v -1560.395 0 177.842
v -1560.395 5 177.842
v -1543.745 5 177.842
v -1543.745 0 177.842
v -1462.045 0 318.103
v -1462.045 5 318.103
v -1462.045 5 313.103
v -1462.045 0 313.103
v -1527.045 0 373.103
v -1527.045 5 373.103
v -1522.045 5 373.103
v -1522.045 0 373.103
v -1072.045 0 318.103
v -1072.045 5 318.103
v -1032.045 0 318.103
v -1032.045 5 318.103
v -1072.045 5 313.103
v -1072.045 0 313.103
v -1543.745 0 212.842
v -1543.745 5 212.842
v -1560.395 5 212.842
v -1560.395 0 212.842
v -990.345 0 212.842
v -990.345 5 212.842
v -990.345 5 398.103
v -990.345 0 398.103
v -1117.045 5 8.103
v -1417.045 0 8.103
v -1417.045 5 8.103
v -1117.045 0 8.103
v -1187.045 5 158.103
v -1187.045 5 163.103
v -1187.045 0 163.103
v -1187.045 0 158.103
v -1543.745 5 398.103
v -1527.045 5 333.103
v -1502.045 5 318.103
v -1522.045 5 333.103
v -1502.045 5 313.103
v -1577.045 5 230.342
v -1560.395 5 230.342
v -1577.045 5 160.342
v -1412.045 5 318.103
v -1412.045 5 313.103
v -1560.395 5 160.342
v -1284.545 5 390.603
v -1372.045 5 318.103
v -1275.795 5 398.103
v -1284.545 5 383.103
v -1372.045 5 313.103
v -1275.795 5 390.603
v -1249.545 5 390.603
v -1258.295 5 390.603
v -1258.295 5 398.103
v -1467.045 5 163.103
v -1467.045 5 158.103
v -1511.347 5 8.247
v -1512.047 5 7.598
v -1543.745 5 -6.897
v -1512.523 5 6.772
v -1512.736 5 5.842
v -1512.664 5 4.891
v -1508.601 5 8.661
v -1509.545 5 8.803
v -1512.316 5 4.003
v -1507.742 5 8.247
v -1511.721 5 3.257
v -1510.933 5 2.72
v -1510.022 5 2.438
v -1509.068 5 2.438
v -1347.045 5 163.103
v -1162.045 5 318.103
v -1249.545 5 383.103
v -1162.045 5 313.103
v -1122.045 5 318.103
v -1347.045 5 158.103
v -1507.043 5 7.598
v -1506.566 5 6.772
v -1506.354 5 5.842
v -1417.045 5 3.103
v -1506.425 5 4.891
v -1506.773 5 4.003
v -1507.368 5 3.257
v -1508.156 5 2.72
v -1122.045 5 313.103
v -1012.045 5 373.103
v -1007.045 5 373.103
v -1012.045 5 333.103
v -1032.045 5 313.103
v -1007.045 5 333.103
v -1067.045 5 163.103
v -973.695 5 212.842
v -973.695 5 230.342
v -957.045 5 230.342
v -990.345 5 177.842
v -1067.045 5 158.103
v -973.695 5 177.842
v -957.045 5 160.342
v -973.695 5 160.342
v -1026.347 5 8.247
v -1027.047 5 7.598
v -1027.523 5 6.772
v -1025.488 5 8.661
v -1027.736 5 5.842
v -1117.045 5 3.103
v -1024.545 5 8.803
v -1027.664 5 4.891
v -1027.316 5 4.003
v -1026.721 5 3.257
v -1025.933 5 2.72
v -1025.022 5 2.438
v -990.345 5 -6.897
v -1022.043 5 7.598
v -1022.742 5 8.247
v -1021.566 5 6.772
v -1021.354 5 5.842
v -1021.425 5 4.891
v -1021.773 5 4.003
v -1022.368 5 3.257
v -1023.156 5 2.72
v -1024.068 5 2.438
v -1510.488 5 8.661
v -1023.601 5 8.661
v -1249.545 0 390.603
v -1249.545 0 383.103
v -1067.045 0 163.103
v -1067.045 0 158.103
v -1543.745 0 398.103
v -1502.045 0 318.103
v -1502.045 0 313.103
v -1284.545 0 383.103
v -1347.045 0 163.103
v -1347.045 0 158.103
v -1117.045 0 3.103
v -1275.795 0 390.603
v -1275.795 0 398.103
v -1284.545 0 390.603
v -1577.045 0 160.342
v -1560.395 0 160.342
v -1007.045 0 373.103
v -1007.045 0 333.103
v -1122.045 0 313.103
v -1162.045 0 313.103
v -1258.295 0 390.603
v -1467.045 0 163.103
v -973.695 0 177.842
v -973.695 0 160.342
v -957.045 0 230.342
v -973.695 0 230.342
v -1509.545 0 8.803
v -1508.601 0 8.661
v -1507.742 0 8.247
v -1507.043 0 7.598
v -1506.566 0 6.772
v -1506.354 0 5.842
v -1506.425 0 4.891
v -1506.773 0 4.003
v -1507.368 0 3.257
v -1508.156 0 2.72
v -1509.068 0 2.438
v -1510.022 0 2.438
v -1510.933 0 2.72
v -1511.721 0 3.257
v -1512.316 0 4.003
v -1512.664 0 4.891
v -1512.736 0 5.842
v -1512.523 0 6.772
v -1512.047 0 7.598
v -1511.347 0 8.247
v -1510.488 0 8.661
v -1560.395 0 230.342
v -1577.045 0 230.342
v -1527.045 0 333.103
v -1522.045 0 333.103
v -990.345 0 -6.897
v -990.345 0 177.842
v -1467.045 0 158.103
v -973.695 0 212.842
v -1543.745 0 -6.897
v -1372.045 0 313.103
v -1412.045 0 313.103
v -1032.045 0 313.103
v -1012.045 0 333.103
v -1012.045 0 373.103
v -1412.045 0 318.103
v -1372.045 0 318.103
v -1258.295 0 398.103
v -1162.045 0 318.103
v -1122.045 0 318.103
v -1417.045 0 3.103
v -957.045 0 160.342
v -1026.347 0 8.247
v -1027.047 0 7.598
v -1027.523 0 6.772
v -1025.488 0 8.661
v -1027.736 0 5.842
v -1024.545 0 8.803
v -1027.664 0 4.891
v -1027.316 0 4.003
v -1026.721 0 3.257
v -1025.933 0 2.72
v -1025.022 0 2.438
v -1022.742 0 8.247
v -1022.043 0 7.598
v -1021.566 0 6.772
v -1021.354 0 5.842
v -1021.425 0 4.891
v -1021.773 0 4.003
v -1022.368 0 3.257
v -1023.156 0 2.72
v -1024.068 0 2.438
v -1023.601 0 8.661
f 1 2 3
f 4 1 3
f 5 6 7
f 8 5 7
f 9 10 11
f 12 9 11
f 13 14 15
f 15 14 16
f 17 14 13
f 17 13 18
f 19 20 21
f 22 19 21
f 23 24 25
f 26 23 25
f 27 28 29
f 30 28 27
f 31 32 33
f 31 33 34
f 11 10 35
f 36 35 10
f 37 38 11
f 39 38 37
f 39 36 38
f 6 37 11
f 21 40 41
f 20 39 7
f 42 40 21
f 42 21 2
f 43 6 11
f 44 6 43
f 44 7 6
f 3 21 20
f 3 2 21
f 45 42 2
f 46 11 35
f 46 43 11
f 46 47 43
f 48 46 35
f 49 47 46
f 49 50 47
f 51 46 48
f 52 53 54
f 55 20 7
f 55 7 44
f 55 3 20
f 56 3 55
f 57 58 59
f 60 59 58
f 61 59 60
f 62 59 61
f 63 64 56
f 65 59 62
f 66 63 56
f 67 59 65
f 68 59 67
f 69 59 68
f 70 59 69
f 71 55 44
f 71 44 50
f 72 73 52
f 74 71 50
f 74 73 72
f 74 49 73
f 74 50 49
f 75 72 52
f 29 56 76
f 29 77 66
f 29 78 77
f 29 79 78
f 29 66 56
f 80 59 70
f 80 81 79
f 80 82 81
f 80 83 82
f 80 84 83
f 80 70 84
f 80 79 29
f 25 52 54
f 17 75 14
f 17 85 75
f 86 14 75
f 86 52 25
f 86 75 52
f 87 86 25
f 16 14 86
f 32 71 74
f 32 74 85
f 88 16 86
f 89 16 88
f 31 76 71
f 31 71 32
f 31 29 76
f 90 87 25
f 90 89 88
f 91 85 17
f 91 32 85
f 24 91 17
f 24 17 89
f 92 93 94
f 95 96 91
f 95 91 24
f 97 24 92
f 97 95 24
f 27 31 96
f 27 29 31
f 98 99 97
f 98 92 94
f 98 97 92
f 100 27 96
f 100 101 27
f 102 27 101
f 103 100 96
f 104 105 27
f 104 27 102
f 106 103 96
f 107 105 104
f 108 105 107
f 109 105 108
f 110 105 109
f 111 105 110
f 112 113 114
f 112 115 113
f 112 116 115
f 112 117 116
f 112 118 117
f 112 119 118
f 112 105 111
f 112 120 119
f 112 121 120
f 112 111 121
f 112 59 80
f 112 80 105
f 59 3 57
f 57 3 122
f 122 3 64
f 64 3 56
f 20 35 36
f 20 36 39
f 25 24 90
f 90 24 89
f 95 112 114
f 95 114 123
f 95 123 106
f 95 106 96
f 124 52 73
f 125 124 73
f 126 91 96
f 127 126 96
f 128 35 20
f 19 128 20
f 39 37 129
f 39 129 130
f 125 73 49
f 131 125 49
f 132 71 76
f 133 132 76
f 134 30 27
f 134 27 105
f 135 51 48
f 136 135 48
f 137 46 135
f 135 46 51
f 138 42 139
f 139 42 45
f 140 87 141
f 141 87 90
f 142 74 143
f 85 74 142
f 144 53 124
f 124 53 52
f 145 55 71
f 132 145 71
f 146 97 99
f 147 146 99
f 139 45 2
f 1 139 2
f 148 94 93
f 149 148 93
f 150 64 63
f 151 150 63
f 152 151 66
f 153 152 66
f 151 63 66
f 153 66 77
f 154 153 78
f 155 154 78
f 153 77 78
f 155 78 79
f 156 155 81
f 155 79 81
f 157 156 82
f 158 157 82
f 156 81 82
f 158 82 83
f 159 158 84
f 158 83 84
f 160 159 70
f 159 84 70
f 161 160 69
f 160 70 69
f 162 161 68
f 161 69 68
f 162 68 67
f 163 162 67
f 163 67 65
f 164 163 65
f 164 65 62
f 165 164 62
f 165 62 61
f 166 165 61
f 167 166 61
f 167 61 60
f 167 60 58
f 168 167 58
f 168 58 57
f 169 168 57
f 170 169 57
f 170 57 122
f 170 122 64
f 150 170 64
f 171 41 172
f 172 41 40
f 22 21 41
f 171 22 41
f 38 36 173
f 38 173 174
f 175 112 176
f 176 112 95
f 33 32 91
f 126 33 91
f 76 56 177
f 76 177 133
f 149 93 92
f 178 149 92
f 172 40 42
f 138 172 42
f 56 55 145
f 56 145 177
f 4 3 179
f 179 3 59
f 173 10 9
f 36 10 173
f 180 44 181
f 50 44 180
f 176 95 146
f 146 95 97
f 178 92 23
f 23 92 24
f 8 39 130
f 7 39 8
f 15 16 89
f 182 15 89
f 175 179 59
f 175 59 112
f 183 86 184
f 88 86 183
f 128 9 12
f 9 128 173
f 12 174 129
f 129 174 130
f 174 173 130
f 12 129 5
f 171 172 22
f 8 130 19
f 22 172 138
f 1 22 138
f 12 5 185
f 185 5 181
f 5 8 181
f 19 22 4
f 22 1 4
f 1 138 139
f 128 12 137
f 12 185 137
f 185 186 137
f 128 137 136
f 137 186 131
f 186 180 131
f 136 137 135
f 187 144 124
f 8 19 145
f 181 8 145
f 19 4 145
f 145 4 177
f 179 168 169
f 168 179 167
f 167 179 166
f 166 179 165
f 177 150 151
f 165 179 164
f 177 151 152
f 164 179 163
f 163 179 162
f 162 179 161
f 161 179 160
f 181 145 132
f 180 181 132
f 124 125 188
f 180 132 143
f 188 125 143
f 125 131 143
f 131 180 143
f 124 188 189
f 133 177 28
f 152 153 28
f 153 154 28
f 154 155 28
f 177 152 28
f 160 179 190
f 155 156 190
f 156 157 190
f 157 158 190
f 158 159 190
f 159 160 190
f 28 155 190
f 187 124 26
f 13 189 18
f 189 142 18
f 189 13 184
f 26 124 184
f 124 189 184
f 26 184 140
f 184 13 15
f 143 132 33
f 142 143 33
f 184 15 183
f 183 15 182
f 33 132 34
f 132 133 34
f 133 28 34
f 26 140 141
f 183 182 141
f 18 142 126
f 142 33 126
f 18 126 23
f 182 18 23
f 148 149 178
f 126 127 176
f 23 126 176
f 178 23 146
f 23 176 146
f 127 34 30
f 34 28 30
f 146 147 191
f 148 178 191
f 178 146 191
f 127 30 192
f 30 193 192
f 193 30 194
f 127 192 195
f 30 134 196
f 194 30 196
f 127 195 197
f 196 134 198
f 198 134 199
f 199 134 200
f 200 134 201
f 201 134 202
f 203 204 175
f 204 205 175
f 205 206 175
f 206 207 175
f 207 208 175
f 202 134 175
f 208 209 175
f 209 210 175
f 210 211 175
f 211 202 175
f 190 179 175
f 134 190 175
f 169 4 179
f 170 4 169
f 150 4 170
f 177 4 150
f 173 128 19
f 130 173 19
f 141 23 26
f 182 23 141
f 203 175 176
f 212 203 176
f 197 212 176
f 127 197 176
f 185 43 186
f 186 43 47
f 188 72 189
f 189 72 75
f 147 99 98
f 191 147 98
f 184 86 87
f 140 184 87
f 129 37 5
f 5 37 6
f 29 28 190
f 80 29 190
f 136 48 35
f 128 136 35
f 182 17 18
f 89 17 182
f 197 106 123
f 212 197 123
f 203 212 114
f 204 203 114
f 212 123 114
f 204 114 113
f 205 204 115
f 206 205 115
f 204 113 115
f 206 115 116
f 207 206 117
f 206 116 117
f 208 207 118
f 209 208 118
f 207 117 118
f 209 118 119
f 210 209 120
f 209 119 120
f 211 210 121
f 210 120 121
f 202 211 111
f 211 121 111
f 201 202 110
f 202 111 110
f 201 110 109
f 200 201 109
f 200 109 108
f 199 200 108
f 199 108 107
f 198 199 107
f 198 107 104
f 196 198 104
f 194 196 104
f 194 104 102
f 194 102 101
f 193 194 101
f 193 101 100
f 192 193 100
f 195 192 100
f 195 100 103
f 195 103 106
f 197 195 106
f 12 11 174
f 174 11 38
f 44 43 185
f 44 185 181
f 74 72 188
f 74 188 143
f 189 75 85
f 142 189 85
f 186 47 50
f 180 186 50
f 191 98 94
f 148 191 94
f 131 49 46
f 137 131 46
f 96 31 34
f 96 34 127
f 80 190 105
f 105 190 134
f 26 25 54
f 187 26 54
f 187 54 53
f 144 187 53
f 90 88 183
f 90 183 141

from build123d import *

# Parameters (mm, degrees)
CROQUIS1_W              = 1660
CROQUIS1_H              = 810
CROQUIS1_W_2            = 300
CROQUIS1_H_2            = 5
SALIENTE_EXTRUIR3_DEPTH = 5
CROQUIS2_W              = 5
CROQUIS2_H              = 40
CROQUIS2_W_2            = 30
CROQUIS2_H_2            = 5
CROQUIS2_W_3            = 120
CROQUIS2_W_4            = 32.5
CROQUIS2_H_3            = 45
CROQUIS2_W_5            = 40
CORTAR_EXTRUIR2_DEPTH   = 10
CROQUIS3_R              = 3.2
CORTAR_EXTRUIR3_DEPTH   = 10
CORTAR_EXTRUIR5_DEPTH   = 10


with BuildPart() as part:
    # Croquis1 → Saliente-Extruir3 (new body)
    with BuildSketch(Plane(origin=(0, 0, 0), x_dir=(1, 0, 0), z_dir=(0, 1, 0))):
        with Locations((-1267.044657187, -398.10267676)):
            Rectangle(CROQUIS1_W, CROQUIS1_H)
        Polygon((-447.044657187, -95.60267676), (-447.044657187, -240.60267676), (-452.044657187, -240.60267676), (-452.044657187, -95.60267676), (-452.044657187, -90.60267676), (-447.044657187, -90.60267676), align=None, mode=Mode.SUBTRACT)
        with Locations((-782.044657187, -5.60267676)):
            Rectangle(CROQUIS1_W_2, CROQUIS1_H_2, mode=Mode.SUBTRACT)
        with Locations((-1267.044657187, -5.60267676)):
            Rectangle(CROQUIS1_W_2, CROQUIS1_H_2, mode=Mode.SUBTRACT)
        with Locations((-1752.044657187, -5.60267676)):
            Rectangle(CROQUIS1_W_2, CROQUIS1_H_2, mode=Mode.SUBTRACT)
        Polygon((-452.044657187, -328.10267676), (-452.044657187, -473.10267676), (-447.044657187, -473.10267676), (-447.044657187, -328.10267676), (-447.044657187, -323.10267676), (-452.044657187, -323.10267676), align=None, mode=Mode.SUBTRACT)
        Polygon((-452.044657187, -560.60267676), (-452.044657187, -705.60267676), (-447.044657187, -705.60267676), (-447.044657187, -560.60267676), (-447.044657187, -555.60267676), (-452.044657187, -555.60267676), align=None, mode=Mode.SUBTRACT)
        Polygon((-2087.044657187, -705.60267676), (-2082.044657187, -705.60267676), (-2082.044657187, -560.60267676), (-2082.044657187, -555.60267676), (-2087.044657187, -555.60267676), (-2087.044657187, -560.60267676), align=None, mode=Mode.SUBTRACT)
        Polygon((-2087.044657187, -473.10267676), (-2082.044657187, -473.10267676), (-2082.044657187, -328.10267676), (-2082.044657187, -323.10267676), (-2087.044657187, -323.10267676), (-2087.044657187, -328.10267676), align=None, mode=Mode.SUBTRACT)
        Polygon((-2087.044657187, -240.60267676), (-2082.044657187, -240.60267676), (-2082.044657187, -95.60267676), (-2082.044657187, -90.60267676), (-2087.044657187, -90.60267676), (-2087.044657187, -95.60267676), align=None, mode=Mode.SUBTRACT)
        with Locations((-1267.044657187, -790.60267676)):
            Rectangle(CROQUIS1_W_2, CROQUIS1_H_2, mode=Mode.SUBTRACT)
        with Locations((-782.044657187, -790.60267676)):
            Rectangle(CROQUIS1_W_2, CROQUIS1_H_2, mode=Mode.SUBTRACT)
        with Locations((-1752.044657187, -790.60267676)):
            Rectangle(CROQUIS1_W_2, CROQUIS1_H_2, mode=Mode.SUBTRACT)
    extrude(amount=SALIENTE_EXTRUIR3_DEPTH)

    # Croquis2 → Cortar-Extruir2 (cut)
    with BuildSketch(Plane(origin=(0, 5, 0), x_dir=(1, 0, 0), z_dir=(0, 1, 0))):
        with Locations((-1009.544657188, -443.10267676)):
            Rectangle(CROQUIS2_W, CROQUIS2_H)
        with Locations((-684.544657187, -635.60267676)):
            Rectangle(CROQUIS2_W_2, CROQUIS2_H_2)
        with Locations((-1127.044657187, -635.60267676)):
            Rectangle(CROQUIS2_W_3, CROQUIS2_H_2)
        with Locations((-1407.044657187, -635.60267676)):
            Rectangle(CROQUIS2_W_3, CROQUIS2_H_2)
        with Locations((-629.544657187, -635.60267676)):
            Rectangle(CROQUIS2_W_2, CROQUIS2_H_2)
        with Locations((-1404.544657188, -480.60267676)):
            Rectangle(CROQUIS2_W_3, CROQUIS2_H_2)
        with Locations((-785.794657187, -480.60267676)):
            Rectangle(CROQUIS2_W_4, CROQUIS2_H_2)
        with Locations((-833.294657187, -480.60267676)):
            Rectangle(CROQUIS2_W_4, CROQUIS2_H_2)
        with Locations((-604.544657187, -513.10267676)):
            Rectangle(CROQUIS2_W, CROQUIS2_H_3)
        with Locations((-864.544657187, -675.60267676)):
            Rectangle(CROQUIS2_W, CROQUIS2_H_3)
        with Locations((-1052.044657188, -315.60267676)):
            Rectangle(CROQUIS2_W_5, CROQUIS2_H_2)
        with Locations((-1142.044657188, -315.60267676)):
            Rectangle(CROQUIS2_W_5, CROQUIS2_H_2)
        with Locations((-1009.544657188, -353.10267676)):
            Rectangle(CROQUIS2_W, CROQUIS2_H)
        with Locations((-1124.544657188, -480.60267676)):
            Rectangle(CROQUIS2_W_3, CROQUIS2_H_2)
        with Locations((-604.544657187, -593.10267676)):
            Rectangle(CROQUIS2_W, CROQUIS2_H_3)
        with Locations((-1127.044657187, -160.60267676)):
            Rectangle(CROQUIS2_W_3, CROQUIS2_H_2)
        with Locations((-1407.044657187, -160.60267676)):
            Rectangle(CROQUIS2_W_3, CROQUIS2_H_2)
        with Locations((-864.544657187, -750.60267676)):
            Rectangle(CROQUIS2_W, CROQUIS2_H_3)
        with Locations((-1392.044657187, -315.60267676)):
            Rectangle(CROQUIS2_W_5, CROQUIS2_H_2)
        with Locations((-1929.544657187, -283.10267676)):
            Rectangle(CROQUIS2_W, CROQUIS2_H_3)
        with Locations((-1482.044657187, -315.60267676)):
            Rectangle(CROQUIS2_W_5, CROQUIS2_H_2)
        with Locations((-1700.794657187, -480.60267676)):
            Rectangle(CROQUIS2_W_4, CROQUIS2_H_2)
        with Locations((-1748.294657187, -480.60267676)):
            Rectangle(CROQUIS2_W_4, CROQUIS2_H_2)
        with Locations((-1929.544657187, -513.10267676)):
            Rectangle(CROQUIS2_W, CROQUIS2_H_3)
        with Locations((-1669.544657187, -750.60267676)):
            Rectangle(CROQUIS2_W, CROQUIS2_H_3)
        with Locations((-1524.544657187, -353.10267676)):
            Rectangle(CROQUIS2_W, CROQUIS2_H)
        with Locations((-1524.544657187, -443.10267676)):
            Rectangle(CROQUIS2_W, CROQUIS2_H)
        with Locations((-1669.544657187, -675.60267676)):
            Rectangle(CROQUIS2_W, CROQUIS2_H_3)
        with Locations((-1904.544657187, -635.60267676)):
            Rectangle(CROQUIS2_W_2, CROQUIS2_H_2)
        with Locations((-1929.544657187, -593.10267676)):
            Rectangle(CROQUIS2_W, CROQUIS2_H_3)
        with Locations((-1849.544657187, -635.60267676)):
            Rectangle(CROQUIS2_W_2, CROQUIS2_H_2)
        with Locations((-604.544657187, -283.10267676)):
            Rectangle(CROQUIS2_W, CROQUIS2_H_3)
        with Locations((-833.294657187, -315.60267676)):
            Rectangle(CROQUIS2_W_4, CROQUIS2_H_2)
        with Locations((-785.794657187, -315.60267676)):
            Rectangle(CROQUIS2_W_4, CROQUIS2_H_2)
        with Locations((-864.544657187, -45.60267676)):
            Rectangle(CROQUIS2_W, CROQUIS2_H_3)
        with Locations((-864.544657187, -120.60267676)):
            Rectangle(CROQUIS2_W, CROQUIS2_H_3)
        with Locations((-629.544657187, -160.60267676)):
            Rectangle(CROQUIS2_W_2, CROQUIS2_H_2)
        with Locations((-604.544657187, -203.10267676)):
            Rectangle(CROQUIS2_W, CROQUIS2_H_3)
        with Locations((-684.544657187, -160.60267676)):
            Rectangle(CROQUIS2_W_2, CROQUIS2_H_2)
        with Locations((-1849.544657187, -160.60267676)):
            Rectangle(CROQUIS2_W_2, CROQUIS2_H_2)
        with Locations((-1904.544657187, -160.60267676)):
            Rectangle(CROQUIS2_W_2, CROQUIS2_H_2)
        with Locations((-1669.544657187, -120.60267676)):
            Rectangle(CROQUIS2_W, CROQUIS2_H_3)
        with Locations((-1929.544657187, -203.10267676)):
            Rectangle(CROQUIS2_W, CROQUIS2_H_3)
        with Locations((-1669.544657187, -45.60267676)):
            Rectangle(CROQUIS2_W, CROQUIS2_H_3)
        with Locations((-1748.294657187, -315.60267676)):
            Rectangle(CROQUIS2_W_4, CROQUIS2_H_2)
        with Locations((-1700.794657187, -315.60267676)):
            Rectangle(CROQUIS2_W_4, CROQUIS2_H_2)
    extrude(amount=-CORTAR_EXTRUIR2_DEPTH, mode=Mode.SUBTRACT)

    # Croquis3 → Cortar-Extruir3 (cut)
    with BuildSketch(Plane(origin=(0, 5, 0), x_dir=(1, 0, 0), z_dir=(0, 1, 0))):
        with Locations(Location((-2084.544657187, -281.85267676, 0), (0, 0, 270))):
            Circle(CROQUIS3_R)
        with Locations(Location((-2084.544657187, -514.35267676, 0), (0, 0, 270))):
            Circle(CROQUIS3_R)
        with Locations(Location((-1509.544657187, -790.60267676, 0), (0, 0, 270))):
            Circle(CROQUIS3_R)
        with Locations(Location((-1024.544657187, -790.60267676, 0), (0, 0, 270))):
            Circle(CROQUIS3_R)
        with Locations(Location((-449.544657187, -514.35267676, 0), (0, 0, 270))):
            Circle(CROQUIS3_R)
        with Locations(Location((-449.544657187, -281.85267676, 0), (0, 0, 270))):
            Circle(CROQUIS3_R)
        with Locations(Location((-1024.544657187, -5.60267676, 0), (0, 0, 270))):
            Circle(CROQUIS3_R)
        with Locations(Location((-1509.544657187, -5.60267676, 0), (0, 0, 270))):
            Circle(CROQUIS3_R)
    extrude(amount=-CORTAR_EXTRUIR3_DEPTH, mode=Mode.SUBTRACT)

    # Croquis5 → Cortar-Extruir5 (cut)
    with BuildSketch(Plane(origin=(0, 5, 0), x_dir=(1, 0, 0), z_dir=(0, 1, 0))):
        Polygon((-1560.394657187, -177.84196813), (-1543.744657187, -177.84196813), (-1543.744657187, -160.34196813), (-1543.744657187, 6.89732324), (-2097.044657187, 6.89732324), (-2097.044657187, -803.10267676), (-437.044657187, -803.10267676), (-437.044657187, 6.89732324), (-990.344657187, 6.89732324), (-990.344657187, -160.34196813), (-990.344657187, -177.84196813), (-973.694657187, -177.84196813), (-973.694657187, -160.34196813), (-957.044657187, -160.34196813), (-957.044657187, -230.34196813), (-973.694657187, -230.34196813), (-973.694657187, -212.84196813), (-990.344657187, -212.84196813), (-990.344657187, -230.34196813), (-990.344657187, -398.10267676), (-1258.294657187, -398.10267676), (-1258.294657187, -390.60267676), (-1249.544657187, -390.60267676), (-1249.544657187, -383.10267676), (-1284.544657187, -383.10267676), (-1284.544657187, -390.60267676), (-1275.794657187, -390.60267676), (-1275.794657187, -398.10267676), (-1543.744657187, -398.10267676), (-1543.744657187, -230.34196813), (-1543.744657187, -212.84196813), (-1560.394657187, -212.84196813), (-1560.394657187, -230.34196813), (-1577.044657187, -230.34196813), (-1577.044657187, -160.34196813), (-1560.394657187, -160.34196813), align=None)
    extrude(amount=-CORTAR_EXTRUIR5_DEPTH, mode=Mode.SUBTRACT)


solid = part.part
